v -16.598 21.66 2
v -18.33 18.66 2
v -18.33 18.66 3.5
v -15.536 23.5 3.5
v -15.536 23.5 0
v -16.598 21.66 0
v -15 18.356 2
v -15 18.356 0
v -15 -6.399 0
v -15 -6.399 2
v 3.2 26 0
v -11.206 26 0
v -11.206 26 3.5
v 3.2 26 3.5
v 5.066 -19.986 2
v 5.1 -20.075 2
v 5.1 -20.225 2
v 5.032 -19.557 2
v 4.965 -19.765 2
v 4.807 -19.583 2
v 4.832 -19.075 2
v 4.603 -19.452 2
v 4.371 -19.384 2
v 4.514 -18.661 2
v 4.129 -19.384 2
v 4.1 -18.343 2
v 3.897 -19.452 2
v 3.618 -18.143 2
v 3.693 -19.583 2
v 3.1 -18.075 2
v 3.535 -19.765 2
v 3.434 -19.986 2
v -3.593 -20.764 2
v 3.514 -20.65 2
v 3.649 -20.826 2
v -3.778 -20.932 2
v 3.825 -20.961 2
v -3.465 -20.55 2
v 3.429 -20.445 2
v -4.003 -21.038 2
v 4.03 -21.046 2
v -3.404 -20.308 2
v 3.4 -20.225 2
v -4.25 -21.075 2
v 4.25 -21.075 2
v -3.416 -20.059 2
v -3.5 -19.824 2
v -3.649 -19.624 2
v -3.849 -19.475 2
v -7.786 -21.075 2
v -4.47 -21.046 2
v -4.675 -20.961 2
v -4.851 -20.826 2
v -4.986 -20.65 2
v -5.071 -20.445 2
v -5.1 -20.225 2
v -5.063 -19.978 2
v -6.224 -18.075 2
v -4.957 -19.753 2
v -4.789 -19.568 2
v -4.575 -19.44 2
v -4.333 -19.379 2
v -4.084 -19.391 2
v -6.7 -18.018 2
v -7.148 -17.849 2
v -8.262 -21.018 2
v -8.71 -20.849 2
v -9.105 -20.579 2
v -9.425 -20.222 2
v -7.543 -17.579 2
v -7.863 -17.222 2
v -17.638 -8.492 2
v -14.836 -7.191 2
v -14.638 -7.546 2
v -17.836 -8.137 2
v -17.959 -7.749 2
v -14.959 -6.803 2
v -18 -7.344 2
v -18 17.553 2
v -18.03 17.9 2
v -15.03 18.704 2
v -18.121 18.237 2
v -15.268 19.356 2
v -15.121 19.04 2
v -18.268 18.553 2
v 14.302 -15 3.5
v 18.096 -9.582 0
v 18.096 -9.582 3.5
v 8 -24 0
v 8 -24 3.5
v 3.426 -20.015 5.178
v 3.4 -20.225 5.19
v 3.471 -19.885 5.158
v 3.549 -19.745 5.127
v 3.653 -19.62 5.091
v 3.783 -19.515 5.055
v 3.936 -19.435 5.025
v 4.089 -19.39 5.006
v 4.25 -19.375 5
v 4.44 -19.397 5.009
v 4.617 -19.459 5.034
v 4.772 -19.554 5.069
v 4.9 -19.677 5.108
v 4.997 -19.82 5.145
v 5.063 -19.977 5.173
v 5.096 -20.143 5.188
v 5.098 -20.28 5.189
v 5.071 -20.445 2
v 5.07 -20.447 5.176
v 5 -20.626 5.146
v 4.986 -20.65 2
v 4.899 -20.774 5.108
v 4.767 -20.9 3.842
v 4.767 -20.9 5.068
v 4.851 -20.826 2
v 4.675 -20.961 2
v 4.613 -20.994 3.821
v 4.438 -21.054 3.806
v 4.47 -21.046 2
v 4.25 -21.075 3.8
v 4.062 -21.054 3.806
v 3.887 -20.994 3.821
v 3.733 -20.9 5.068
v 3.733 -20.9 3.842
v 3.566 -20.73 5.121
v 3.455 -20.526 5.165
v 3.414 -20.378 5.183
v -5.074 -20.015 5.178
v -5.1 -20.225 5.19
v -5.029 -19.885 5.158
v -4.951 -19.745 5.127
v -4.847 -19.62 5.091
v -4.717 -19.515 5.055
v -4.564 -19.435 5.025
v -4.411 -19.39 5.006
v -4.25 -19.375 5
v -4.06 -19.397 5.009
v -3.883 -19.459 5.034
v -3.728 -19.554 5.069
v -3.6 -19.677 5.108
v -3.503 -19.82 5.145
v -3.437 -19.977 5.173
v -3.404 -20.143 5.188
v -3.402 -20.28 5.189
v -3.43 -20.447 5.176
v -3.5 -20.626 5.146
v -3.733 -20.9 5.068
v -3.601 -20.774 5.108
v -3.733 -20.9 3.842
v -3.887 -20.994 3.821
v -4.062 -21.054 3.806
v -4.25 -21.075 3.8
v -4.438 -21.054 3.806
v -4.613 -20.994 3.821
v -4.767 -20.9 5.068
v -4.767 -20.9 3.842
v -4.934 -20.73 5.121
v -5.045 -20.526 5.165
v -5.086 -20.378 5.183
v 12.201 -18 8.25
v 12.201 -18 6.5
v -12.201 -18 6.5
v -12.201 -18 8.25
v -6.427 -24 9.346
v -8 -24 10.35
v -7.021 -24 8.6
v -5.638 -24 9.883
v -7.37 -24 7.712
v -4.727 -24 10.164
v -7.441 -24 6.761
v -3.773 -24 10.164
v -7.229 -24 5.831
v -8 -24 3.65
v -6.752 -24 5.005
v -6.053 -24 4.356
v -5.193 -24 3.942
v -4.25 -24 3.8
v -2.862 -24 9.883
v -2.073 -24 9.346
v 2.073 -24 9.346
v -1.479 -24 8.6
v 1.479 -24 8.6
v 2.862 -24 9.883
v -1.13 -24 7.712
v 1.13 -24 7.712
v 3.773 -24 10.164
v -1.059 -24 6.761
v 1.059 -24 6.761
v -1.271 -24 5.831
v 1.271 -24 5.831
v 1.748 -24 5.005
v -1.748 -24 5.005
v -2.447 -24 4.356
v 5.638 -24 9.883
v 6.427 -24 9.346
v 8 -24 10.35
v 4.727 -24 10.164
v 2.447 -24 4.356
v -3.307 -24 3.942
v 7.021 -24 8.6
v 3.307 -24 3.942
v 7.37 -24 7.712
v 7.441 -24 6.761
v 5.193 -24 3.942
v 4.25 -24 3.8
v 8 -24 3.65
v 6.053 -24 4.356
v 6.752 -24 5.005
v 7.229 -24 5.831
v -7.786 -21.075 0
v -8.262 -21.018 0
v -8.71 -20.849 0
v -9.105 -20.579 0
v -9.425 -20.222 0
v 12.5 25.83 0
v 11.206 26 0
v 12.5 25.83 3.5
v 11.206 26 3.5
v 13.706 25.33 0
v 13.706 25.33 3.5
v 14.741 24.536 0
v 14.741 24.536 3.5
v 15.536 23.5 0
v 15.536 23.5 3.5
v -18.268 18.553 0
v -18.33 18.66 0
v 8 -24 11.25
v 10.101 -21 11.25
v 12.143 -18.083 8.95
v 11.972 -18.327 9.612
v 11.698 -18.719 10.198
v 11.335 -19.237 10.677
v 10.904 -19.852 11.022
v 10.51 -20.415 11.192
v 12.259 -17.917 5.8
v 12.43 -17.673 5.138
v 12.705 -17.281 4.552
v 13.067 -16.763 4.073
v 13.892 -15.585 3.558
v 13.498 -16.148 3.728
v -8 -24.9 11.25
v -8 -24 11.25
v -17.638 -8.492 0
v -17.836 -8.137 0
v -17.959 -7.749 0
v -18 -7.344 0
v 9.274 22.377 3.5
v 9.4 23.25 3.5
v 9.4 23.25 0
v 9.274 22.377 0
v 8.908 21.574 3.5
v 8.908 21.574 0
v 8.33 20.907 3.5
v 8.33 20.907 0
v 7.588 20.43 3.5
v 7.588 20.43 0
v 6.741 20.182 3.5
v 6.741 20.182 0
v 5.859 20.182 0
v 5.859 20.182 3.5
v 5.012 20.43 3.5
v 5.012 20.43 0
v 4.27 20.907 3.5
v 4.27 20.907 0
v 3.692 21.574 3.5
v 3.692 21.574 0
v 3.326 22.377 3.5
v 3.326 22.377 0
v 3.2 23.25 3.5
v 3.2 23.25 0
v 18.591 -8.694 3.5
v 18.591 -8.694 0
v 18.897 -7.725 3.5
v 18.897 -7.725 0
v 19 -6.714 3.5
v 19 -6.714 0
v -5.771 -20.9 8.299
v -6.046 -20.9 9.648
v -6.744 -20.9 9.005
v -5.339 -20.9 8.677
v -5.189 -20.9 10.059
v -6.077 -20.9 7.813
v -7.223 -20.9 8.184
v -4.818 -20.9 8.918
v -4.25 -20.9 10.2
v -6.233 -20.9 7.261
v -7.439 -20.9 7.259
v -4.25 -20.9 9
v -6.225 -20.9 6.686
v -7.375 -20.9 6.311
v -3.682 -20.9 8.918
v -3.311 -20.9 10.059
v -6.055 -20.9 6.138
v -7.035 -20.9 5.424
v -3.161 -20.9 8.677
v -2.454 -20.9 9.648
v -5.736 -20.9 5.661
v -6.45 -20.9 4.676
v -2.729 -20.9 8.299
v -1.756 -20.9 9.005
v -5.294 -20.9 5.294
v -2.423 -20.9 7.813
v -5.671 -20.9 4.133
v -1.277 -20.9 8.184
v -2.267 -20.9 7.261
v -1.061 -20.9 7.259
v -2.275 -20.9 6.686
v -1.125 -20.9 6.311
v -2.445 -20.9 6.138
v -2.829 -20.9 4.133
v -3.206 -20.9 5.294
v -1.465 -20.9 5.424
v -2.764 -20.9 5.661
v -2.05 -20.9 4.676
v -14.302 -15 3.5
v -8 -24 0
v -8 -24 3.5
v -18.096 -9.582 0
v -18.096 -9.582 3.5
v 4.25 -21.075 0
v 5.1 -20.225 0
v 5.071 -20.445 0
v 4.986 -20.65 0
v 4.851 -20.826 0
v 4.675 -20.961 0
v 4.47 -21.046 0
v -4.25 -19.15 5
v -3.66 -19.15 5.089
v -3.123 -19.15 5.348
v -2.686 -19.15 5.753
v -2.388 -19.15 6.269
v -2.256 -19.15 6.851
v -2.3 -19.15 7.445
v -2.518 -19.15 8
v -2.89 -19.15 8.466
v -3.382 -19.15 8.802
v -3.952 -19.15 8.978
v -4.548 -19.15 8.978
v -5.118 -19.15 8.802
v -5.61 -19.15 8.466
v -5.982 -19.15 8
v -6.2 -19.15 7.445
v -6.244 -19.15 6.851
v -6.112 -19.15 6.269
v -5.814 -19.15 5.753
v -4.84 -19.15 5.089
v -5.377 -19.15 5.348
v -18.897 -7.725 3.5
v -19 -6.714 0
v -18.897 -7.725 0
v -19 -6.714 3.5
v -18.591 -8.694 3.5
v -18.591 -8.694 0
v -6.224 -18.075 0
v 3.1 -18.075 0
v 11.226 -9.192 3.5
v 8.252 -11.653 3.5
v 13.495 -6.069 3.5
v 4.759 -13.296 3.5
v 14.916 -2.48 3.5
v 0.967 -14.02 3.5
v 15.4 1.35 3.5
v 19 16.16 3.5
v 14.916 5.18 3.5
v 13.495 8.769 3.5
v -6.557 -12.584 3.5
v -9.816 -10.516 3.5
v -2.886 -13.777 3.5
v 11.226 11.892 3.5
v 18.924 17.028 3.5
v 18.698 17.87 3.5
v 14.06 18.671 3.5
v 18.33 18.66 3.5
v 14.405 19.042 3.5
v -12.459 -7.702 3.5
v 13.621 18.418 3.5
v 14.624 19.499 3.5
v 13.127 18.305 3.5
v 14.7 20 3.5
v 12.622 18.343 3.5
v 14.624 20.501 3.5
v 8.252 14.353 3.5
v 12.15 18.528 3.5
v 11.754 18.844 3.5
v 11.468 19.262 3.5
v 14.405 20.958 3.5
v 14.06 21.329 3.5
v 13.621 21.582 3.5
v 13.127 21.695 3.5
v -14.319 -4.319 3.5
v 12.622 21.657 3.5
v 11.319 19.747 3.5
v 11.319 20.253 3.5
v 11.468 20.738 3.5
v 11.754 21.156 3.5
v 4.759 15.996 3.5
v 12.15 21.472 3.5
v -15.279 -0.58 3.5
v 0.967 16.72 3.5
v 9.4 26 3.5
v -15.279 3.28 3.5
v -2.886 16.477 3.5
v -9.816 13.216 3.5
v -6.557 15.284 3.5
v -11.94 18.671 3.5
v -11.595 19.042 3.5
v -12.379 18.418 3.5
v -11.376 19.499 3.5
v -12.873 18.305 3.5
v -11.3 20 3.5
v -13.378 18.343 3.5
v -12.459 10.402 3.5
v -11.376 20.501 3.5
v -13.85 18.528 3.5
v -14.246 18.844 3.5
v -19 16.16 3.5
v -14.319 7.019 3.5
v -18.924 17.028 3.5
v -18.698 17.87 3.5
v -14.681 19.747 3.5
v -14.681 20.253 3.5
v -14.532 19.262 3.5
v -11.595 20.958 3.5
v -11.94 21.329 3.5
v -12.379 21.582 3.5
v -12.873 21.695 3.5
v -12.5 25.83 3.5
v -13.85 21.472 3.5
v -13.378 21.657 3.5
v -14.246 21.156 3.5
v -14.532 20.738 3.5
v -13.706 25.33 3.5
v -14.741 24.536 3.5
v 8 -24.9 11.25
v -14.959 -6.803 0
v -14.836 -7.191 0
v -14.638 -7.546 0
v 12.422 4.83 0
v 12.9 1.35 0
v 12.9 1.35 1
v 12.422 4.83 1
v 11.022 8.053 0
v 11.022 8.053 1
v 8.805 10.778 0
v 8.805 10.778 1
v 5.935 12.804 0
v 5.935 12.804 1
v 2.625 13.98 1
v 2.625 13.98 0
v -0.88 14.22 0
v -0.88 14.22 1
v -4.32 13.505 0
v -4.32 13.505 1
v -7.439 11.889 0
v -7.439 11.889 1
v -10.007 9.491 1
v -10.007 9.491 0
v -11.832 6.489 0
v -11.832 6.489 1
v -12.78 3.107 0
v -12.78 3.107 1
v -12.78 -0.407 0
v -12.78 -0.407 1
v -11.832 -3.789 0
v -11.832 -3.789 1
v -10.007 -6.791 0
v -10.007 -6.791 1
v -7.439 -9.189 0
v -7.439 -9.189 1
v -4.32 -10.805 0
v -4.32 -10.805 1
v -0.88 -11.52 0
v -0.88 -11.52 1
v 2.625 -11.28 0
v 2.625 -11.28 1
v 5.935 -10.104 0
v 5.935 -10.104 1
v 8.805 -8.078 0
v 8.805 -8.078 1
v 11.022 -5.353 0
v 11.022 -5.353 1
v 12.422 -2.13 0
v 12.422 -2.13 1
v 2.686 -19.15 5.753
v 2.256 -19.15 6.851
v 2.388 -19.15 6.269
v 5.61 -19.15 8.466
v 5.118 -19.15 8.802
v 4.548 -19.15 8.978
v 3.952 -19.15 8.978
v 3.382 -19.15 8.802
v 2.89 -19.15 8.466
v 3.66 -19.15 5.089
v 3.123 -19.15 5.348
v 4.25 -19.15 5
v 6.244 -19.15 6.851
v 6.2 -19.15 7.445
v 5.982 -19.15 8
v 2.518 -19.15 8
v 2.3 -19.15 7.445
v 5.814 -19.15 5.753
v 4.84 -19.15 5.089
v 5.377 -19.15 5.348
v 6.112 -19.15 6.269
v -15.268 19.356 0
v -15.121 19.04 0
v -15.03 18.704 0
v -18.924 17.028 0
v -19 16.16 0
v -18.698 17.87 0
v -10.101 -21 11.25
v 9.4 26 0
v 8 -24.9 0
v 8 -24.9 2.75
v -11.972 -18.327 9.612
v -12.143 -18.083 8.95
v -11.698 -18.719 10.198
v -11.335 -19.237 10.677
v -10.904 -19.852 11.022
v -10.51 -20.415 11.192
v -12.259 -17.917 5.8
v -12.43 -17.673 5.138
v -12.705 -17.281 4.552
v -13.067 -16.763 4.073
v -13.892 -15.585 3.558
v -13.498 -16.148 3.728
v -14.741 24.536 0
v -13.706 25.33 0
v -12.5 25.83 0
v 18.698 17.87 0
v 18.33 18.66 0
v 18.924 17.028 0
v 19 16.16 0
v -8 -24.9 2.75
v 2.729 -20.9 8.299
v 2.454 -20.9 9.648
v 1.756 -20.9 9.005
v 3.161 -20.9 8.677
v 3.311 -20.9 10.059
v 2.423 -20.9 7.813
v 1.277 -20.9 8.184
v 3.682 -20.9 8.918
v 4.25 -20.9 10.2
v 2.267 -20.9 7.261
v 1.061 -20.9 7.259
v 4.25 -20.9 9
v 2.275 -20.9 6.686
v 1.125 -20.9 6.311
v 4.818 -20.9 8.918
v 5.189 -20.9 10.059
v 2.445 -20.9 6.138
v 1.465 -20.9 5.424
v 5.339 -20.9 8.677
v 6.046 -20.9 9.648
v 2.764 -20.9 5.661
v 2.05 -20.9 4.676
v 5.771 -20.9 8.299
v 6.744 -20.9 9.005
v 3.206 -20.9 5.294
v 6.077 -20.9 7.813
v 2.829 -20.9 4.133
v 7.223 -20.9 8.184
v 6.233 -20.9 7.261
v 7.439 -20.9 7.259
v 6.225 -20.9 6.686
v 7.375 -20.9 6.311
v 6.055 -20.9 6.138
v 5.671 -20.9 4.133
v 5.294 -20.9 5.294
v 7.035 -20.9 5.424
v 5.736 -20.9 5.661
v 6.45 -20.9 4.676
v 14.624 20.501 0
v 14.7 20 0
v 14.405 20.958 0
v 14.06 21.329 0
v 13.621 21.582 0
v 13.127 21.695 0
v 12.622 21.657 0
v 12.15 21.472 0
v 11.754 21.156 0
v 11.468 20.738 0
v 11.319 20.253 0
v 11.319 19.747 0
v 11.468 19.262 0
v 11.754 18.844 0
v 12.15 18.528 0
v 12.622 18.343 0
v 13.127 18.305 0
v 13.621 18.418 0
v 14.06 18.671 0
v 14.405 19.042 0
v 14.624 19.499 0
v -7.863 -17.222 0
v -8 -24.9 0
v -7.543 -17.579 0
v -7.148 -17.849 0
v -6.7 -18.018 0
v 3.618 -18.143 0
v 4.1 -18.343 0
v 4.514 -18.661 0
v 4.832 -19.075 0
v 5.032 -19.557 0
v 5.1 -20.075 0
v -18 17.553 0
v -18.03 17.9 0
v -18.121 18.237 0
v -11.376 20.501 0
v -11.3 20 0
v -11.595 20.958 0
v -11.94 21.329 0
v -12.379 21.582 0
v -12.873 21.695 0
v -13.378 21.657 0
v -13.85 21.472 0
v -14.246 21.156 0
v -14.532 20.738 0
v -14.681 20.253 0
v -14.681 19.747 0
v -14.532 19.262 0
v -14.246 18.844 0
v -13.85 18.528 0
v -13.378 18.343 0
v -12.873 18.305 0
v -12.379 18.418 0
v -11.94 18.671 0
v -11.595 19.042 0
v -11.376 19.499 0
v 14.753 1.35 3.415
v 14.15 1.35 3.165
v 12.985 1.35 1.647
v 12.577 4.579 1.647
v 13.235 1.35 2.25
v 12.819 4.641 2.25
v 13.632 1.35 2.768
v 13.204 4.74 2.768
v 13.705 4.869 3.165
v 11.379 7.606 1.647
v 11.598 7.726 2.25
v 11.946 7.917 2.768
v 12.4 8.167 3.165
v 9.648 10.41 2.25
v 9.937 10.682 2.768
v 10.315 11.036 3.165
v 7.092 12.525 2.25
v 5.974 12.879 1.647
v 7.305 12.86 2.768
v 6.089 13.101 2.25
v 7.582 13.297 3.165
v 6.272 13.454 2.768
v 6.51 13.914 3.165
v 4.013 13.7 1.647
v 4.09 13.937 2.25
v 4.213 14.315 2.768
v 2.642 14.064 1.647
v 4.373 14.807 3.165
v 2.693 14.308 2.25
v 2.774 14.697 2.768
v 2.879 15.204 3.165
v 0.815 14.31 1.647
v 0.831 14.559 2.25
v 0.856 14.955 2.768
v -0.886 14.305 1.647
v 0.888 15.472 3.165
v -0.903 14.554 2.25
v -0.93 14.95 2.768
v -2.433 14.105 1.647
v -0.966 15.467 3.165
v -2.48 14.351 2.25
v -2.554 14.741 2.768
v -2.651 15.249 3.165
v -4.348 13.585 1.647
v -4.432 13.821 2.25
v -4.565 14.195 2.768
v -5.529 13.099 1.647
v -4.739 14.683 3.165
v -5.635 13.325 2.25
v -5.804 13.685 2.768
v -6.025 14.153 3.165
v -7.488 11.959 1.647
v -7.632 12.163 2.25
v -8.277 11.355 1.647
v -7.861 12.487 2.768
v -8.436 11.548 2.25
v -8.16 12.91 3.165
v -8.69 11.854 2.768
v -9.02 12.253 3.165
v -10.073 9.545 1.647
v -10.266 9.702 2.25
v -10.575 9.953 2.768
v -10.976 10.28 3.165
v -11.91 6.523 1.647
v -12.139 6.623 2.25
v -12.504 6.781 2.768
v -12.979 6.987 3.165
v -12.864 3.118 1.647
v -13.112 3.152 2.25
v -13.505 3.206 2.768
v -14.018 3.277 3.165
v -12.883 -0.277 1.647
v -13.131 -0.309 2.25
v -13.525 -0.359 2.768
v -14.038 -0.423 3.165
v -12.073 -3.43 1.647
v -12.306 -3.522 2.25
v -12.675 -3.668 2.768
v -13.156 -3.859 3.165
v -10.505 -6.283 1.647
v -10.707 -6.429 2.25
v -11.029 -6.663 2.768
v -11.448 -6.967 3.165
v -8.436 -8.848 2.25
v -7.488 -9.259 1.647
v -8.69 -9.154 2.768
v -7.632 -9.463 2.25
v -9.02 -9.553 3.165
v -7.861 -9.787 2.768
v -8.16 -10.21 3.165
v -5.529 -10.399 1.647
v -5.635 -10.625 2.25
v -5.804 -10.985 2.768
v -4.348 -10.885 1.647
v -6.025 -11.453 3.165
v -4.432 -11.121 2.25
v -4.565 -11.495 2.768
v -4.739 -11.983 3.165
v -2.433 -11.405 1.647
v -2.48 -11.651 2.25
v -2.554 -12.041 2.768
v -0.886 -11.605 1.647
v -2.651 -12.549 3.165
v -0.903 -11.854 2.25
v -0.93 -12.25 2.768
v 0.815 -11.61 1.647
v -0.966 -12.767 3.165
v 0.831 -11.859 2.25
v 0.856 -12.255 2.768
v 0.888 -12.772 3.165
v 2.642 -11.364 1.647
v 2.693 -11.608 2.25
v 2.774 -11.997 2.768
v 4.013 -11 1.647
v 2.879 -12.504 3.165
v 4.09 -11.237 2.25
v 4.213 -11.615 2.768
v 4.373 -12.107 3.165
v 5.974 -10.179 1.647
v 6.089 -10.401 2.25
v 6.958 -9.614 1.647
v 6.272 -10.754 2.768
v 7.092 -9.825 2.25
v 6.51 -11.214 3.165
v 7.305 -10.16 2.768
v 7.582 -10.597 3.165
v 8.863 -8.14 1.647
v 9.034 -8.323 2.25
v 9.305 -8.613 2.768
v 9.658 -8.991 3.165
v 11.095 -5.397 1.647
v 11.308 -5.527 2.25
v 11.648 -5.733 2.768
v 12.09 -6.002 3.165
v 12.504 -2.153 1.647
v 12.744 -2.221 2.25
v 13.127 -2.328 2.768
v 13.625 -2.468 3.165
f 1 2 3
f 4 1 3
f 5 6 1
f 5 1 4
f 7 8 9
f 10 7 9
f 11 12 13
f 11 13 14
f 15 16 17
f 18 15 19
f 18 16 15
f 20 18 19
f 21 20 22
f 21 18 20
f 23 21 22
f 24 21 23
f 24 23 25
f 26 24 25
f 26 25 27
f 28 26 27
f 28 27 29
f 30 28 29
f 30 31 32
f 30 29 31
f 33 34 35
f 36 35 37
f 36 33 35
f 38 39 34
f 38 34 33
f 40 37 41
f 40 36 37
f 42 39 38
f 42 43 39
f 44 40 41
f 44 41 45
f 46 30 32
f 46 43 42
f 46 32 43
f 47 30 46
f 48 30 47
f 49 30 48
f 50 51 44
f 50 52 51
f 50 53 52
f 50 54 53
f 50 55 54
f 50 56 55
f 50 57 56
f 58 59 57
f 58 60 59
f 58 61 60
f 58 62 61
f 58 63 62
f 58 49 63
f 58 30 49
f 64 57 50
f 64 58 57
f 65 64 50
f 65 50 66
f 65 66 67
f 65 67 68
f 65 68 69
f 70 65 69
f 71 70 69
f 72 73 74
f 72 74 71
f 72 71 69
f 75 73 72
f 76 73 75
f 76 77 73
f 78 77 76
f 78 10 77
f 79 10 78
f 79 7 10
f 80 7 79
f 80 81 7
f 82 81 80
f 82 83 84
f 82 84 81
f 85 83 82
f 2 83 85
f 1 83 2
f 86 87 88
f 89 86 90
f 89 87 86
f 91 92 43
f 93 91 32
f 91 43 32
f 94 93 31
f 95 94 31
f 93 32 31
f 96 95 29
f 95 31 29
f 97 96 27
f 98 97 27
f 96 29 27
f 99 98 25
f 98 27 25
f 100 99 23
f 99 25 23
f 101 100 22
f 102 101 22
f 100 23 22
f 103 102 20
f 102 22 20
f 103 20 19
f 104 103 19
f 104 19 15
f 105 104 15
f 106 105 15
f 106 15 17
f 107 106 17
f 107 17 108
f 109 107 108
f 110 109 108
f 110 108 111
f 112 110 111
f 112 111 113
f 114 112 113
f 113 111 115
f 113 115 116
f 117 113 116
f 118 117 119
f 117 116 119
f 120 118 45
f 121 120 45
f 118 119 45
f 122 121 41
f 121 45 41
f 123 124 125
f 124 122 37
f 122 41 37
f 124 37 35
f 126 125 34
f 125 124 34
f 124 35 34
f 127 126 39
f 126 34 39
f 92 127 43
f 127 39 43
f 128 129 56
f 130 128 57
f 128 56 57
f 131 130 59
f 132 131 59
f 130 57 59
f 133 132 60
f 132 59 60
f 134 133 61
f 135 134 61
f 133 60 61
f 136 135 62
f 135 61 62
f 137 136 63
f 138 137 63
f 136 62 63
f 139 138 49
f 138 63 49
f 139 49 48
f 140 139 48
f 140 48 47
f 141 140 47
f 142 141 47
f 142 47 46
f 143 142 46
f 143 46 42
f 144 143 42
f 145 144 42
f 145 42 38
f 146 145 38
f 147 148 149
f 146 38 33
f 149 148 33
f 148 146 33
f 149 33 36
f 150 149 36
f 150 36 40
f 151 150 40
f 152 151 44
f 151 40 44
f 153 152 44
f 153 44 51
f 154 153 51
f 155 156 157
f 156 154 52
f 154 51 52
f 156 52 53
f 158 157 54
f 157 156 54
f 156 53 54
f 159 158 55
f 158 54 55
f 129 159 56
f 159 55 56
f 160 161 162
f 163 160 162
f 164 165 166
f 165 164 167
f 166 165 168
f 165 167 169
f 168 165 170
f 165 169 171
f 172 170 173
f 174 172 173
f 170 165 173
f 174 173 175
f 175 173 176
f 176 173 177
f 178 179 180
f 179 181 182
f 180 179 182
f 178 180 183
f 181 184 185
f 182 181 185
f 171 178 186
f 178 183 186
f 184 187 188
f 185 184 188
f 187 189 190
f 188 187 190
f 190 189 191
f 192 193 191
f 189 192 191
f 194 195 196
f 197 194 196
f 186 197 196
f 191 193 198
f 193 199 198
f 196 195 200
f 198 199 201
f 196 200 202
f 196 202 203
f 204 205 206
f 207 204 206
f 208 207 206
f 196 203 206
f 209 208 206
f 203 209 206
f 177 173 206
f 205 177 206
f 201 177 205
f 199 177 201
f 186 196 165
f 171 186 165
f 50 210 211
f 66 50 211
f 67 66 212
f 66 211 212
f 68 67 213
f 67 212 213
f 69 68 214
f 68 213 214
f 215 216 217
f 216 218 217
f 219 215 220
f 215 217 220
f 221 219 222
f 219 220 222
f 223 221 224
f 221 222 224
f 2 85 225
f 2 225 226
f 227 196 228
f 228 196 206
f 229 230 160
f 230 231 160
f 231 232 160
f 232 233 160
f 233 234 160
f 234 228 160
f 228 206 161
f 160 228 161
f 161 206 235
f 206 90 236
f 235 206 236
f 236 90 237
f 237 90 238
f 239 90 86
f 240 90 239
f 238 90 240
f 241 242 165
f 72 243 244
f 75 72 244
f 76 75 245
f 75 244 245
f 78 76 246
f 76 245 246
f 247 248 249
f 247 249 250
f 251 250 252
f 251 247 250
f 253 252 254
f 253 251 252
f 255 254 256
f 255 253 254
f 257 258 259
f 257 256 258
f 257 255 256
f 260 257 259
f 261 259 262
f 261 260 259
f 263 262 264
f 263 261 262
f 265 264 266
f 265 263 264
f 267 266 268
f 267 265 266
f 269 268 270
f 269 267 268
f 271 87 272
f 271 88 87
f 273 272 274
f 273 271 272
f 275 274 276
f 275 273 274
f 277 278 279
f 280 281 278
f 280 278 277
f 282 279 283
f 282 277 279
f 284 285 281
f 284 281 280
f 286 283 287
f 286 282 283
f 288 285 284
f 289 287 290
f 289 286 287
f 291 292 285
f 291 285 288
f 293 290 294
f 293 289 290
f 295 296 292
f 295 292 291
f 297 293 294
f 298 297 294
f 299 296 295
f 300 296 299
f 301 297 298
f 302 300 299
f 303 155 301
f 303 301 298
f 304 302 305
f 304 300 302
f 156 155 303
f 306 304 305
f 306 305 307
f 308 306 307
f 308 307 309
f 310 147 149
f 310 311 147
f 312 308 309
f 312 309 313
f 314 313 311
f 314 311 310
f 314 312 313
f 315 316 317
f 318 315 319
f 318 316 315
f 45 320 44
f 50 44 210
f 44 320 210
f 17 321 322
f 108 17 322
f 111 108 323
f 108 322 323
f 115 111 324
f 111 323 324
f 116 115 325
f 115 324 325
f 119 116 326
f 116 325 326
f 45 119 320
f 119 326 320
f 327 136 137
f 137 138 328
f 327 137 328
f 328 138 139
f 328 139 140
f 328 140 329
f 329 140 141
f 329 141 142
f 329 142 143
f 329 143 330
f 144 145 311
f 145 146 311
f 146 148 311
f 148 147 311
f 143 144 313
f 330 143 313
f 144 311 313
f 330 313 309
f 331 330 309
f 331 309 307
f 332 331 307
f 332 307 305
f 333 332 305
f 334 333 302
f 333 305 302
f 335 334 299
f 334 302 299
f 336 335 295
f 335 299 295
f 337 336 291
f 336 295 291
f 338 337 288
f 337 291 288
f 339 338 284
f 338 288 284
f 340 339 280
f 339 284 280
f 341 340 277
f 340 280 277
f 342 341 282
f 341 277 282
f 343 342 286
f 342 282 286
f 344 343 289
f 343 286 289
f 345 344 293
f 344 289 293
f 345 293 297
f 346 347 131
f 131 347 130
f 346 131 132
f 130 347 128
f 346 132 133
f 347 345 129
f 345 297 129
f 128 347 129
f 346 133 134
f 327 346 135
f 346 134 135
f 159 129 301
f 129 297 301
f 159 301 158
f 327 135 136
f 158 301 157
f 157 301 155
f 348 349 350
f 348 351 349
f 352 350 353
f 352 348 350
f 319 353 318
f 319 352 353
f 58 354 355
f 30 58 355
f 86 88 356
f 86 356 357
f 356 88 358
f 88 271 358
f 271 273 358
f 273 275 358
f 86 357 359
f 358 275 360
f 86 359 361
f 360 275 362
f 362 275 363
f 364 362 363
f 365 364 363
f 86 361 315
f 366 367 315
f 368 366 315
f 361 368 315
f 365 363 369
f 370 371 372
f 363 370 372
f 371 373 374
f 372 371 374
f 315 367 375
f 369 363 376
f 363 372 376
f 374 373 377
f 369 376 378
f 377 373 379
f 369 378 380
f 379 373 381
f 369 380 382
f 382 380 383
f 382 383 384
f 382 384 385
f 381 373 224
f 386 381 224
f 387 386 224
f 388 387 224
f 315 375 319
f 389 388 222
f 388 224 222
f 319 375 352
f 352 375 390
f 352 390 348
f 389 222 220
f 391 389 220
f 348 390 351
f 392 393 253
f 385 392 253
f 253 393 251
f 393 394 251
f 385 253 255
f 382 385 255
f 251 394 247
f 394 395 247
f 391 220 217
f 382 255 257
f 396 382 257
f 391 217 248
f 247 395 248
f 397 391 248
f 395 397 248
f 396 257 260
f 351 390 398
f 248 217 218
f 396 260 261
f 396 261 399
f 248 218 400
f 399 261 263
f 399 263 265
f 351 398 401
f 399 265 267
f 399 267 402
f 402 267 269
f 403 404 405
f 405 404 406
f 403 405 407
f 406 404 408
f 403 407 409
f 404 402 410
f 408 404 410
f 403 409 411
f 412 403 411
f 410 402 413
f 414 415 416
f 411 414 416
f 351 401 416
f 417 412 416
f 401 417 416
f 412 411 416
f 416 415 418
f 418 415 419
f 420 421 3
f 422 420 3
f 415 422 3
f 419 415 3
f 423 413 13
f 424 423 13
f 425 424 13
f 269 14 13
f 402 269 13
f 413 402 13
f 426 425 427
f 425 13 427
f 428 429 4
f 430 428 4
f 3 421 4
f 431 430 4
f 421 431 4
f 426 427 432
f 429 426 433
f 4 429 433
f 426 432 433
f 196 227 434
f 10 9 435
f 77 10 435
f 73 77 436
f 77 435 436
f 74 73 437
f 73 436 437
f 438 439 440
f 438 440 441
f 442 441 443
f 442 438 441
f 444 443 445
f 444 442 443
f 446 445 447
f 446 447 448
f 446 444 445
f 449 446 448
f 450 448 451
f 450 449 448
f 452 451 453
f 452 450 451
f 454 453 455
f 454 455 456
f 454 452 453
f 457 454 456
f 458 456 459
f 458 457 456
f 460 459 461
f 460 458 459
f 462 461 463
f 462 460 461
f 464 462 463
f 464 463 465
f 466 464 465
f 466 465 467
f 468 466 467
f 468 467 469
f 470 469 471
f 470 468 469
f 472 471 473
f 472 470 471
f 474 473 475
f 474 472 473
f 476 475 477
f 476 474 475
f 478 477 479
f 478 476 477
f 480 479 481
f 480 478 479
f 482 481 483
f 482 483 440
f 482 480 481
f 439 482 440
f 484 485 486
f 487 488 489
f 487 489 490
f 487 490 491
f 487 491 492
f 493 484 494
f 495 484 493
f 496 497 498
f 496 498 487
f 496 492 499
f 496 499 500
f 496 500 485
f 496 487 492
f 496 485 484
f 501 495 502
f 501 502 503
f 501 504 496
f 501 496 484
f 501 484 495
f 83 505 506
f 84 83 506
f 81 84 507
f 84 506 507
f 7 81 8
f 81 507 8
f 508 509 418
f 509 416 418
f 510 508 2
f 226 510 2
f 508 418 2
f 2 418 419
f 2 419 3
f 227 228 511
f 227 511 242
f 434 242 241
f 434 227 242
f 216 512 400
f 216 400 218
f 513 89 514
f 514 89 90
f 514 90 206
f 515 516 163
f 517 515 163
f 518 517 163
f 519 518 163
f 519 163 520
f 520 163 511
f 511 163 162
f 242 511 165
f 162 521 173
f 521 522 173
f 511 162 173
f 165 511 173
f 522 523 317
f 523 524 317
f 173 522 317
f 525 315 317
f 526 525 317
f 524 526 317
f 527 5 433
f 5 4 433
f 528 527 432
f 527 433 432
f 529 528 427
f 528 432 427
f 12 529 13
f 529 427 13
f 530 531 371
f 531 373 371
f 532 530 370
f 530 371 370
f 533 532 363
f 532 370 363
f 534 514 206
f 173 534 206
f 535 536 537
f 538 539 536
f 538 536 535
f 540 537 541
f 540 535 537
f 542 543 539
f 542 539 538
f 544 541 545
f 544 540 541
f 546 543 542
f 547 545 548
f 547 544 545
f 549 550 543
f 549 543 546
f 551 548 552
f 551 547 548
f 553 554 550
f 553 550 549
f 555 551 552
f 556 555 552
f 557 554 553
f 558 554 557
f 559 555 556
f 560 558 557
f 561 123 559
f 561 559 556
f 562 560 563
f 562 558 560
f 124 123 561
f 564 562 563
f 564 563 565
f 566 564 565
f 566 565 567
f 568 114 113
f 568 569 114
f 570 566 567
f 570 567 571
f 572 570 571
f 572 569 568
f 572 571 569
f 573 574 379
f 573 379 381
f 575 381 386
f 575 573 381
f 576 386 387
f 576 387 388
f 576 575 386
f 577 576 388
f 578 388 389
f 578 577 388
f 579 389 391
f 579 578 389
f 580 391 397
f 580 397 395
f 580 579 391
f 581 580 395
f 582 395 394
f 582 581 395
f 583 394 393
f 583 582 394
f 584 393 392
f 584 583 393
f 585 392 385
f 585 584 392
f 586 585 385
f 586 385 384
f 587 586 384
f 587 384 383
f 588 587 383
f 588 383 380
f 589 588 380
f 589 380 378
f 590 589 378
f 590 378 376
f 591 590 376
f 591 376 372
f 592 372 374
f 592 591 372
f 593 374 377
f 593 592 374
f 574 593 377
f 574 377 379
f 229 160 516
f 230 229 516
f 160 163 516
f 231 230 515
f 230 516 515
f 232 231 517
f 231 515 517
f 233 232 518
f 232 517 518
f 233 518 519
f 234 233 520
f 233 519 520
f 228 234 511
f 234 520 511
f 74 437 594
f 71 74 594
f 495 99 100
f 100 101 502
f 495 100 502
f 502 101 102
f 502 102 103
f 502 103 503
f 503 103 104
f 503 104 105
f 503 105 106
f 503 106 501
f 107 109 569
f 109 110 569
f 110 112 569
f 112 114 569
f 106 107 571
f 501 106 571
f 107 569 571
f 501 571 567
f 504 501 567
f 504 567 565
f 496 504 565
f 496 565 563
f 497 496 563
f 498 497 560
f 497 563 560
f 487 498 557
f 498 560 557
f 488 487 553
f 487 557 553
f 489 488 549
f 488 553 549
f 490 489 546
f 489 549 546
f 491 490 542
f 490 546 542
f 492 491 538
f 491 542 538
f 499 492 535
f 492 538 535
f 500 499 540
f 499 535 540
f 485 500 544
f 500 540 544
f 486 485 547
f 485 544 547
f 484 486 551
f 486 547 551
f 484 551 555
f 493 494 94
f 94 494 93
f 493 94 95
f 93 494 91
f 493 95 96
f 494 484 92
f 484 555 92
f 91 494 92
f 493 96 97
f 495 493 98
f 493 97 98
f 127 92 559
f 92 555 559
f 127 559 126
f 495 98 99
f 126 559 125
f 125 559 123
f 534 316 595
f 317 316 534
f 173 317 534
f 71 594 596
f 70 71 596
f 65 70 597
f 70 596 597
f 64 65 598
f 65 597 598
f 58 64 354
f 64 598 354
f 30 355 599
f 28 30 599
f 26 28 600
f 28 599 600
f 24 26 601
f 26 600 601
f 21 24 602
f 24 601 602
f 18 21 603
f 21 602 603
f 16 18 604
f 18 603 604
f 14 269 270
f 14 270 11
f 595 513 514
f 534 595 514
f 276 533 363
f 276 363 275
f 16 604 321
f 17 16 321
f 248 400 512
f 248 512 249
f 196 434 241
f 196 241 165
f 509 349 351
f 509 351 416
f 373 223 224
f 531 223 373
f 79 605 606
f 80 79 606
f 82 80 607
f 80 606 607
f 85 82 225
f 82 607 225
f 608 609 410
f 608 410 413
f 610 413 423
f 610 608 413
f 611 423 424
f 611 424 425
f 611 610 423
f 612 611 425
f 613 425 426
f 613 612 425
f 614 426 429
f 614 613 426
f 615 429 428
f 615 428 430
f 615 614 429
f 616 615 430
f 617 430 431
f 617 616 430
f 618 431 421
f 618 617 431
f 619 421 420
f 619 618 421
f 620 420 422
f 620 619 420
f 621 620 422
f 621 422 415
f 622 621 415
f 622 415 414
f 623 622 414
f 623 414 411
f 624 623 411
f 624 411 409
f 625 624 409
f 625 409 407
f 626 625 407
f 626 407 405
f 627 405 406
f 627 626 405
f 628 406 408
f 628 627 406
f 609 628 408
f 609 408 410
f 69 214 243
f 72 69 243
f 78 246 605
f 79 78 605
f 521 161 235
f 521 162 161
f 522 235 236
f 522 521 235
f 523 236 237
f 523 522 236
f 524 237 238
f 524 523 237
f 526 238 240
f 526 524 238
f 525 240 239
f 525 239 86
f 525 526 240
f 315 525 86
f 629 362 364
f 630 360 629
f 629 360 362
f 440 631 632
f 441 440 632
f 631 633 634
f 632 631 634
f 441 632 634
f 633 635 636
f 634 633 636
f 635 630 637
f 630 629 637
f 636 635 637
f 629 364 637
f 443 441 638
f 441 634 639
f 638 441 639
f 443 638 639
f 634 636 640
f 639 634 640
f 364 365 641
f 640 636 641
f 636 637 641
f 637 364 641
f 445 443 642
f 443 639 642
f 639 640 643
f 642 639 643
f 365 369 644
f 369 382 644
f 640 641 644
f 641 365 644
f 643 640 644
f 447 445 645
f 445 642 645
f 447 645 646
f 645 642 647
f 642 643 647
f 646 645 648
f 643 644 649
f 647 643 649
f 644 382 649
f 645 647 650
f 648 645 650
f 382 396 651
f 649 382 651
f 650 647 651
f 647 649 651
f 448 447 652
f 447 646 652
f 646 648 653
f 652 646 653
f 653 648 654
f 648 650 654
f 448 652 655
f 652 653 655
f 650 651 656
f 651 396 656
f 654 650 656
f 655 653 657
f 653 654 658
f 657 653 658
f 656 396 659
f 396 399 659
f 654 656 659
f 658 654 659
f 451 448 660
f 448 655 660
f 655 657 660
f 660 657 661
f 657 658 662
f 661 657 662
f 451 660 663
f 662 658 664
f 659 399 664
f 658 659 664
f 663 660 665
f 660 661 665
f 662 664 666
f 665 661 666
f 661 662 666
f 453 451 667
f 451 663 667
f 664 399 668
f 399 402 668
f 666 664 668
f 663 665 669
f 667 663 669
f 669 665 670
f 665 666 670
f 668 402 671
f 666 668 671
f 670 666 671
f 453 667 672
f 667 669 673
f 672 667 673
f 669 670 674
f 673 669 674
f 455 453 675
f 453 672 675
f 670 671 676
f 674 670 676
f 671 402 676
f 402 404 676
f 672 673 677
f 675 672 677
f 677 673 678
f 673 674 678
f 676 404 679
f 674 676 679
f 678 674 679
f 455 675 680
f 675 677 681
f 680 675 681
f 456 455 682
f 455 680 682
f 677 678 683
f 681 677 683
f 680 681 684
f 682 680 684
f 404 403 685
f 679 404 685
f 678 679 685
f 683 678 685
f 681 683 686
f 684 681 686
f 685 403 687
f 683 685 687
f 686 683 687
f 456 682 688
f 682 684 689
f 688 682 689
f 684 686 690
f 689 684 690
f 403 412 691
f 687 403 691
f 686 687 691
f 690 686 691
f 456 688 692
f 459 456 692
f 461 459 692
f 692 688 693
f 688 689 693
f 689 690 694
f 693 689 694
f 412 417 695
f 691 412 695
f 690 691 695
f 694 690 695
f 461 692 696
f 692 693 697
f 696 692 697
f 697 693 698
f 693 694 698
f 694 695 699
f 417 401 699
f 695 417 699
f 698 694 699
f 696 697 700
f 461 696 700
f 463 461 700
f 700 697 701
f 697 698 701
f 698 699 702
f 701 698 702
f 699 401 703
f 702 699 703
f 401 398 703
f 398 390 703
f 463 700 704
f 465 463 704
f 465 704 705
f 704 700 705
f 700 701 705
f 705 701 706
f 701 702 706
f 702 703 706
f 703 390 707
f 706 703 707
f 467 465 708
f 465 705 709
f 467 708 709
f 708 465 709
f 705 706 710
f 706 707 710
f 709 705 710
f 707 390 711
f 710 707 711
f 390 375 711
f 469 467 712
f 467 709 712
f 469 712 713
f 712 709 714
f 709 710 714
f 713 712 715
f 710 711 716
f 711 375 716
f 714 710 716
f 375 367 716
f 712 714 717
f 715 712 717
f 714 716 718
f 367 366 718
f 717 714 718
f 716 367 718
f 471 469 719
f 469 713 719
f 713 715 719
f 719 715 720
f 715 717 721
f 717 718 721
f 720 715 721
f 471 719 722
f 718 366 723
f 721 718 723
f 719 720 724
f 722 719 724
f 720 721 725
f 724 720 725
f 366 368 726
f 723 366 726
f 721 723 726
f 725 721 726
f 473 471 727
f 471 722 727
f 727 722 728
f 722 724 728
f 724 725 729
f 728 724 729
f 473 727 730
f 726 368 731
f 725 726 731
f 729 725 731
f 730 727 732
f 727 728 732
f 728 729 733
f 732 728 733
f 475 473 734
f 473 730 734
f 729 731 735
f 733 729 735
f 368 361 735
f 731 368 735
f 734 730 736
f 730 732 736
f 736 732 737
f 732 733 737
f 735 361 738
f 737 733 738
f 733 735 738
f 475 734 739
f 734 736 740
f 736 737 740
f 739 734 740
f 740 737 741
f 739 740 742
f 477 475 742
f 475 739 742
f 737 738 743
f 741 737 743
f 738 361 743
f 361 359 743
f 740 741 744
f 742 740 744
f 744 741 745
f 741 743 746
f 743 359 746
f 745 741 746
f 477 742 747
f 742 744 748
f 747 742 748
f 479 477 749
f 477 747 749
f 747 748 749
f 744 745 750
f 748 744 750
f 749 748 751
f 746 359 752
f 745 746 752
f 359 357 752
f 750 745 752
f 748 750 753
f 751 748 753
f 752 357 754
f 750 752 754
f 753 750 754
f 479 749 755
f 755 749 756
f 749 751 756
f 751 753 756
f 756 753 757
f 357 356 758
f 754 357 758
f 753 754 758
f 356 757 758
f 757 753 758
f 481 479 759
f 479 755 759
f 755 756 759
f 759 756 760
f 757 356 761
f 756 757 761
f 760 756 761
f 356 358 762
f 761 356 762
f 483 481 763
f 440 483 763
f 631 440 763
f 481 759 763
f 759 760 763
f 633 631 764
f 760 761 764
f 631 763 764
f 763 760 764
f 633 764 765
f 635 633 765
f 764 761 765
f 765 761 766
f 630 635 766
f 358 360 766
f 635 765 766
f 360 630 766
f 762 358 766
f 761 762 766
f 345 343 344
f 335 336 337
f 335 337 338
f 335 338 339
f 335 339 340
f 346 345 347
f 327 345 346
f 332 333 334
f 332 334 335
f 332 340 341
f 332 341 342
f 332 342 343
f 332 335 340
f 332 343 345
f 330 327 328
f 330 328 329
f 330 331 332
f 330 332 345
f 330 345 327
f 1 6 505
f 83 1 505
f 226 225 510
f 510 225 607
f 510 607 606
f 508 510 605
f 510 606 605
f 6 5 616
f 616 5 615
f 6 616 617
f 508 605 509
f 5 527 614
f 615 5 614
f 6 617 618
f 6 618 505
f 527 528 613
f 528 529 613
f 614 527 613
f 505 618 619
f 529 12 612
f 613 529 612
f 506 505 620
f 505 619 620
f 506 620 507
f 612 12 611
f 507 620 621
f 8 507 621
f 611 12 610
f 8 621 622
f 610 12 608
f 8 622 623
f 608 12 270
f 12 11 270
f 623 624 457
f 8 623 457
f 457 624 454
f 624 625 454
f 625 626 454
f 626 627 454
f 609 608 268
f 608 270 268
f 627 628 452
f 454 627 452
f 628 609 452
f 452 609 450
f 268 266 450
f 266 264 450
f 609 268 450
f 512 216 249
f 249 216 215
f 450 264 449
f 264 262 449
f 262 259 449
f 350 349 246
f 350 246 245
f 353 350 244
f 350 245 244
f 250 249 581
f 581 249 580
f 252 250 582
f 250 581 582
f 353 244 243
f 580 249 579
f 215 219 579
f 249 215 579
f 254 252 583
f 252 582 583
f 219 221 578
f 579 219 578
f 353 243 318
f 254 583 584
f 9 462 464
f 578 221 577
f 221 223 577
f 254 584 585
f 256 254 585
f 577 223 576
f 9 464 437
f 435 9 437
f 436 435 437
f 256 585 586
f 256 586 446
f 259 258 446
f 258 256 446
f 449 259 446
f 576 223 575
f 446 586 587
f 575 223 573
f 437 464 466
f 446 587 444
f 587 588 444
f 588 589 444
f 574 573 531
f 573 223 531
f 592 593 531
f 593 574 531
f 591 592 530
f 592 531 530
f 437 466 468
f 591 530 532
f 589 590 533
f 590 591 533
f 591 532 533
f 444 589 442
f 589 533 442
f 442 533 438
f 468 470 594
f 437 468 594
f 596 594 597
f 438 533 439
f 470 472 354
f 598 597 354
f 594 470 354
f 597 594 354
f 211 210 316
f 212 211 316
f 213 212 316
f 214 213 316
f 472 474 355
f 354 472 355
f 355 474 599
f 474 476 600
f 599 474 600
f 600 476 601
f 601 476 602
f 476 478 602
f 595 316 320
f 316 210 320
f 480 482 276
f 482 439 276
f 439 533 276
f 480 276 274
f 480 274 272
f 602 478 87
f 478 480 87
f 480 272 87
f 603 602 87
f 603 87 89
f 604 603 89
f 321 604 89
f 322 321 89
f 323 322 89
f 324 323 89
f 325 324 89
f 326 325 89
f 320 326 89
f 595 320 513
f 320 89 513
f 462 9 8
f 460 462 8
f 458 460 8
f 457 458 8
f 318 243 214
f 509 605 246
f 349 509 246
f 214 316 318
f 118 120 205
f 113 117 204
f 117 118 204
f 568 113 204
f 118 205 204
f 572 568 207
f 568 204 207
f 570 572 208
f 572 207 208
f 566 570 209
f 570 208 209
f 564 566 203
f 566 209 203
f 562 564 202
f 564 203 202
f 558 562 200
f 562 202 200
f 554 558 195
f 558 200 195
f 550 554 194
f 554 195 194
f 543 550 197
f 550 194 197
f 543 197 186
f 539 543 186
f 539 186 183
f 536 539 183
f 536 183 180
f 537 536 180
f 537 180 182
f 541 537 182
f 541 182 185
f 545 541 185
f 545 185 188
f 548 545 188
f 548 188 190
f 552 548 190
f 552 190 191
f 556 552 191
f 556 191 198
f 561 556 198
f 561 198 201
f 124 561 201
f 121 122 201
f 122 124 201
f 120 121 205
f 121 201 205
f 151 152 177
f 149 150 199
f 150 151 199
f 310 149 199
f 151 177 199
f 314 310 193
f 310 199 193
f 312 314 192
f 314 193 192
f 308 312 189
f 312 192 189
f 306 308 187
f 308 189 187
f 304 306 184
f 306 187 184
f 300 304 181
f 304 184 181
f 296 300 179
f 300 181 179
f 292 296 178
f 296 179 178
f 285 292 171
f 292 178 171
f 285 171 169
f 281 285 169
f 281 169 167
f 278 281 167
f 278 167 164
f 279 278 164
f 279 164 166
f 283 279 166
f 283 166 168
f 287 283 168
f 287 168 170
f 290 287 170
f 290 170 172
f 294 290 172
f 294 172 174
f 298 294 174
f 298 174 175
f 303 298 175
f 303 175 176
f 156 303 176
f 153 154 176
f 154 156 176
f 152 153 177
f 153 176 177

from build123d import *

# Parameters (mm, degrees)
SKETCH1_R           = 1.7
SKETCH1_R_2         = 12.9
BOSS_EXTRUDE1_DEPTH = 3.5
FILLET1_R           = 2.5
FILLET2_R           = 5
BOSS_EXTRUDE2_DEPTH = 7.75
FILLET3_R           = 3
SKETCH3_R           = 3.2
CUT_EXTRUDE1_DEPTH  = 3.1
SKETCH4_R           = 2
CUT_EXTRUDE2_DEPTH  = 1.75
SKETCH5_R           = 0.85
CUT_EXTRUDE3_DEPTH  = 7
CUT_EXTRUDE4_DEPTH  = 2
BOSS_EXTRUDE3_DEPTH = 16
CUT_EXTRUDE5_DEPTH  = 34.12193382


with BuildPart() as part:
    # Sketch1 → Boss-Extrude1 (new body)
    with BuildSketch(Plane.XY):
        Polygon((-19, -8.290371926), (-19, 17.5), (-14.092522712, 26), (14.092522712, 26), (19, 17.5), (19, -8.290371926), (8, -24), (-8, -24), align=None)
        with Locations((-13, 20)):
            Circle(SKETCH1_R, mode=Mode.SUBTRACT)
        with Locations((13, 20)):
            Circle(SKETCH1_R, mode=Mode.SUBTRACT)
        with Locations((0, 1.35)):
            Circle(SKETCH1_R_2, mode=Mode.SUBTRACT)
    extrude(amount=BOSS_EXTRUDE1_DEPTH)

    # Fillet1
    fillet1_edges = [part.edges().sort_by_distance(p)[0] for p in [
        (-12.9, 1.35, 3.5),
    ]]
    fillet(fillet1_edges, radius=FILLET1_R)

    # Fillet2
    fillet2_edges = [part.edges().sort_by_distance(p)[0] for p in [
        (-19, -8.290371926, 1.75),
        (-19, 17.5, 1.75),
        (-14.092522712, 26, 1.75),
        (14.092522712, 26, 1.75),
        (19, 17.5, 1.75),
        (19, -8.290371926, 1.75),
    ]]
    fillet(fillet2_edges, radius=FILLET2_R)

    # Sketch2 → Boss-Extrude2 (add)
    with BuildSketch(Plane.XY.offset(3.5)):
        Polygon((-12.201245229, -18), (-8, -24), (8, -24), (12.201245229, -18), align=None)
    extrude(amount=BOSS_EXTRUDE2_DEPTH)

    # Fillet3
    fillet3_edges = [part.edges().sort_by_distance(p)[0] for p in [
        (0, -18, 3.5),
        (0, -18, 11.25),
    ]]
    fillet(fillet3_edges, radius=FILLET3_R)

    # Sketch3 → Cut-Extrude1 (cut)
    with BuildSketch(Plane.XZ.offset(24)):
        with Locations(Location((-4.25, 7, 0), (0, 0, 270))):
            Circle(SKETCH3_R)
        with Locations(Location((4.25, 7, 0), (0, 0, 270))):
            Circle(SKETCH3_R)
    extrude(amount=-CUT_EXTRUDE1_DEPTH, mode=Mode.SUBTRACT)

    # Sketch4 → Cut-Extrude2 (cut)
    with BuildSketch(Plane.XZ.offset(20.9)):
        with Locations(Location((-4.25, 7, 0), (0, 0, 270))):
            Circle(SKETCH4_R)
        with Locations(Location((4.25, 7, 0), (0, 0, 270))):
            Circle(SKETCH4_R)
    extrude(amount=-CUT_EXTRUDE2_DEPTH, mode=Mode.SUBTRACT)

    # Sketch5 → Cut-Extrude3 (cut)
    with BuildSketch(Plane(origin=(0, 0, 0), x_dir=(-1, 0, 0), z_dir=(0, 0, -1))):
        with Locations((4.25, -20.225)):
            Circle(SKETCH5_R)
        with Locations((-4.25, -20.225)):
            Circle(SKETCH5_R)
    extrude(amount=-CUT_EXTRUDE3_DEPTH, mode=Mode.SUBTRACT)

    # Sketch6 → Cut-Extrude4 (cut)
    with BuildSketch(Plane(origin=(0, 0, 0), x_dir=(-1, 0, 0), z_dir=(0, 0, -1))):
        with BuildLine():
            Line((18.330127019, 18.660254038), (16.598076211, 21.660254038))
            Line((16.598076211, 21.660254038), (15.267949192, 19.356406461))
            ThreePointArc((15.267949192, 19.356406461), (15.068148347, 18.874044551), (15, 18.356406461))
            Line((15, 18.356406461), (15, -6.398579193))
            ThreePointArc((15, -6.398579193), (14.907433901, -6.999990792), (14.638304089, -7.545732065))
            Line((14.638304089, -7.545732065), (7.862801296, -17.222152873))
            ThreePointArc((7.862801296, -17.222152873), (7.147994434, -17.849021666), (6.224497208, -18.075))
            Line((6.224497208, -18.075), (-3.1, -18.075))
            ThreePointArc((-3.1, -18.075), (-4.514213562, -18.660786438), (-5.1, -20.075))
            Line((-5.1, -20.075), (-5.1, -20.225))
            ThreePointArc((-5.1, -20.225), (-4.851040764, -20.826040764), (-4.25, -21.075))
            Line((-4.25, -21.075), (4.25, -21.075))
            Line((4.25, -21.075), (7.786198359, -21.075))
            ThreePointArc((7.786198359, -21.075), (8.709695586, -20.849021666), (9.424502448, -20.222152873))
            Line((9.424502448, -20.222152873), (17.638304089, -8.491628432))
            ThreePointArc((17.638304089, -8.491628432), (17.907433901, -7.945887158), (18, -7.344475559))
            Line((18, -7.344475559), (18, 17.552558883))
            ThreePointArc((18, 17.552558883), (18.068148347, 18.070196973), (18.267949192, 18.552558883))
            Line((18.267949192, 18.552558883), (18.330127019, 18.660254038))
        make_face()
    extrude(amount=-CUT_EXTRUDE4_DEPTH, mode=Mode.SUBTRACT)

    # Sketch7 → Boss-Extrude3 (add)
    with BuildSketch(Plane(origin=(8, 0, 0), x_dir=(0, 0, -1), z_dir=(1, 0, 0))):
        Polygon((-11.25, -24), (-11.25, -24.9), (-10.35, -24), align=None)
        Polygon((-2.75, -24.9), (-3.65, -24), (0, -24), (0, -24.9), align=None)
    extrude(amount=-BOSS_EXTRUDE3_DEPTH)

    # Sketch9 → Cut-Extrude5 (cut, through all)
    with BuildSketch(Plane.XY.offset(3.5)):
        with BuildLine():
            Line((3.2, 23.25), (3.2, 26))
            Line((3.2, 26), (9.4, 26))
            Line((9.4, 26), (9.4, 23.25))
            ThreePointArc((9.4, 23.25), (6.3, 20.15), (3.2, 23.25))
        make_face()
    extrude(amount=-CUT_EXTRUDE5_DEPTH, mode=Mode.SUBTRACT)


solid = part.part
